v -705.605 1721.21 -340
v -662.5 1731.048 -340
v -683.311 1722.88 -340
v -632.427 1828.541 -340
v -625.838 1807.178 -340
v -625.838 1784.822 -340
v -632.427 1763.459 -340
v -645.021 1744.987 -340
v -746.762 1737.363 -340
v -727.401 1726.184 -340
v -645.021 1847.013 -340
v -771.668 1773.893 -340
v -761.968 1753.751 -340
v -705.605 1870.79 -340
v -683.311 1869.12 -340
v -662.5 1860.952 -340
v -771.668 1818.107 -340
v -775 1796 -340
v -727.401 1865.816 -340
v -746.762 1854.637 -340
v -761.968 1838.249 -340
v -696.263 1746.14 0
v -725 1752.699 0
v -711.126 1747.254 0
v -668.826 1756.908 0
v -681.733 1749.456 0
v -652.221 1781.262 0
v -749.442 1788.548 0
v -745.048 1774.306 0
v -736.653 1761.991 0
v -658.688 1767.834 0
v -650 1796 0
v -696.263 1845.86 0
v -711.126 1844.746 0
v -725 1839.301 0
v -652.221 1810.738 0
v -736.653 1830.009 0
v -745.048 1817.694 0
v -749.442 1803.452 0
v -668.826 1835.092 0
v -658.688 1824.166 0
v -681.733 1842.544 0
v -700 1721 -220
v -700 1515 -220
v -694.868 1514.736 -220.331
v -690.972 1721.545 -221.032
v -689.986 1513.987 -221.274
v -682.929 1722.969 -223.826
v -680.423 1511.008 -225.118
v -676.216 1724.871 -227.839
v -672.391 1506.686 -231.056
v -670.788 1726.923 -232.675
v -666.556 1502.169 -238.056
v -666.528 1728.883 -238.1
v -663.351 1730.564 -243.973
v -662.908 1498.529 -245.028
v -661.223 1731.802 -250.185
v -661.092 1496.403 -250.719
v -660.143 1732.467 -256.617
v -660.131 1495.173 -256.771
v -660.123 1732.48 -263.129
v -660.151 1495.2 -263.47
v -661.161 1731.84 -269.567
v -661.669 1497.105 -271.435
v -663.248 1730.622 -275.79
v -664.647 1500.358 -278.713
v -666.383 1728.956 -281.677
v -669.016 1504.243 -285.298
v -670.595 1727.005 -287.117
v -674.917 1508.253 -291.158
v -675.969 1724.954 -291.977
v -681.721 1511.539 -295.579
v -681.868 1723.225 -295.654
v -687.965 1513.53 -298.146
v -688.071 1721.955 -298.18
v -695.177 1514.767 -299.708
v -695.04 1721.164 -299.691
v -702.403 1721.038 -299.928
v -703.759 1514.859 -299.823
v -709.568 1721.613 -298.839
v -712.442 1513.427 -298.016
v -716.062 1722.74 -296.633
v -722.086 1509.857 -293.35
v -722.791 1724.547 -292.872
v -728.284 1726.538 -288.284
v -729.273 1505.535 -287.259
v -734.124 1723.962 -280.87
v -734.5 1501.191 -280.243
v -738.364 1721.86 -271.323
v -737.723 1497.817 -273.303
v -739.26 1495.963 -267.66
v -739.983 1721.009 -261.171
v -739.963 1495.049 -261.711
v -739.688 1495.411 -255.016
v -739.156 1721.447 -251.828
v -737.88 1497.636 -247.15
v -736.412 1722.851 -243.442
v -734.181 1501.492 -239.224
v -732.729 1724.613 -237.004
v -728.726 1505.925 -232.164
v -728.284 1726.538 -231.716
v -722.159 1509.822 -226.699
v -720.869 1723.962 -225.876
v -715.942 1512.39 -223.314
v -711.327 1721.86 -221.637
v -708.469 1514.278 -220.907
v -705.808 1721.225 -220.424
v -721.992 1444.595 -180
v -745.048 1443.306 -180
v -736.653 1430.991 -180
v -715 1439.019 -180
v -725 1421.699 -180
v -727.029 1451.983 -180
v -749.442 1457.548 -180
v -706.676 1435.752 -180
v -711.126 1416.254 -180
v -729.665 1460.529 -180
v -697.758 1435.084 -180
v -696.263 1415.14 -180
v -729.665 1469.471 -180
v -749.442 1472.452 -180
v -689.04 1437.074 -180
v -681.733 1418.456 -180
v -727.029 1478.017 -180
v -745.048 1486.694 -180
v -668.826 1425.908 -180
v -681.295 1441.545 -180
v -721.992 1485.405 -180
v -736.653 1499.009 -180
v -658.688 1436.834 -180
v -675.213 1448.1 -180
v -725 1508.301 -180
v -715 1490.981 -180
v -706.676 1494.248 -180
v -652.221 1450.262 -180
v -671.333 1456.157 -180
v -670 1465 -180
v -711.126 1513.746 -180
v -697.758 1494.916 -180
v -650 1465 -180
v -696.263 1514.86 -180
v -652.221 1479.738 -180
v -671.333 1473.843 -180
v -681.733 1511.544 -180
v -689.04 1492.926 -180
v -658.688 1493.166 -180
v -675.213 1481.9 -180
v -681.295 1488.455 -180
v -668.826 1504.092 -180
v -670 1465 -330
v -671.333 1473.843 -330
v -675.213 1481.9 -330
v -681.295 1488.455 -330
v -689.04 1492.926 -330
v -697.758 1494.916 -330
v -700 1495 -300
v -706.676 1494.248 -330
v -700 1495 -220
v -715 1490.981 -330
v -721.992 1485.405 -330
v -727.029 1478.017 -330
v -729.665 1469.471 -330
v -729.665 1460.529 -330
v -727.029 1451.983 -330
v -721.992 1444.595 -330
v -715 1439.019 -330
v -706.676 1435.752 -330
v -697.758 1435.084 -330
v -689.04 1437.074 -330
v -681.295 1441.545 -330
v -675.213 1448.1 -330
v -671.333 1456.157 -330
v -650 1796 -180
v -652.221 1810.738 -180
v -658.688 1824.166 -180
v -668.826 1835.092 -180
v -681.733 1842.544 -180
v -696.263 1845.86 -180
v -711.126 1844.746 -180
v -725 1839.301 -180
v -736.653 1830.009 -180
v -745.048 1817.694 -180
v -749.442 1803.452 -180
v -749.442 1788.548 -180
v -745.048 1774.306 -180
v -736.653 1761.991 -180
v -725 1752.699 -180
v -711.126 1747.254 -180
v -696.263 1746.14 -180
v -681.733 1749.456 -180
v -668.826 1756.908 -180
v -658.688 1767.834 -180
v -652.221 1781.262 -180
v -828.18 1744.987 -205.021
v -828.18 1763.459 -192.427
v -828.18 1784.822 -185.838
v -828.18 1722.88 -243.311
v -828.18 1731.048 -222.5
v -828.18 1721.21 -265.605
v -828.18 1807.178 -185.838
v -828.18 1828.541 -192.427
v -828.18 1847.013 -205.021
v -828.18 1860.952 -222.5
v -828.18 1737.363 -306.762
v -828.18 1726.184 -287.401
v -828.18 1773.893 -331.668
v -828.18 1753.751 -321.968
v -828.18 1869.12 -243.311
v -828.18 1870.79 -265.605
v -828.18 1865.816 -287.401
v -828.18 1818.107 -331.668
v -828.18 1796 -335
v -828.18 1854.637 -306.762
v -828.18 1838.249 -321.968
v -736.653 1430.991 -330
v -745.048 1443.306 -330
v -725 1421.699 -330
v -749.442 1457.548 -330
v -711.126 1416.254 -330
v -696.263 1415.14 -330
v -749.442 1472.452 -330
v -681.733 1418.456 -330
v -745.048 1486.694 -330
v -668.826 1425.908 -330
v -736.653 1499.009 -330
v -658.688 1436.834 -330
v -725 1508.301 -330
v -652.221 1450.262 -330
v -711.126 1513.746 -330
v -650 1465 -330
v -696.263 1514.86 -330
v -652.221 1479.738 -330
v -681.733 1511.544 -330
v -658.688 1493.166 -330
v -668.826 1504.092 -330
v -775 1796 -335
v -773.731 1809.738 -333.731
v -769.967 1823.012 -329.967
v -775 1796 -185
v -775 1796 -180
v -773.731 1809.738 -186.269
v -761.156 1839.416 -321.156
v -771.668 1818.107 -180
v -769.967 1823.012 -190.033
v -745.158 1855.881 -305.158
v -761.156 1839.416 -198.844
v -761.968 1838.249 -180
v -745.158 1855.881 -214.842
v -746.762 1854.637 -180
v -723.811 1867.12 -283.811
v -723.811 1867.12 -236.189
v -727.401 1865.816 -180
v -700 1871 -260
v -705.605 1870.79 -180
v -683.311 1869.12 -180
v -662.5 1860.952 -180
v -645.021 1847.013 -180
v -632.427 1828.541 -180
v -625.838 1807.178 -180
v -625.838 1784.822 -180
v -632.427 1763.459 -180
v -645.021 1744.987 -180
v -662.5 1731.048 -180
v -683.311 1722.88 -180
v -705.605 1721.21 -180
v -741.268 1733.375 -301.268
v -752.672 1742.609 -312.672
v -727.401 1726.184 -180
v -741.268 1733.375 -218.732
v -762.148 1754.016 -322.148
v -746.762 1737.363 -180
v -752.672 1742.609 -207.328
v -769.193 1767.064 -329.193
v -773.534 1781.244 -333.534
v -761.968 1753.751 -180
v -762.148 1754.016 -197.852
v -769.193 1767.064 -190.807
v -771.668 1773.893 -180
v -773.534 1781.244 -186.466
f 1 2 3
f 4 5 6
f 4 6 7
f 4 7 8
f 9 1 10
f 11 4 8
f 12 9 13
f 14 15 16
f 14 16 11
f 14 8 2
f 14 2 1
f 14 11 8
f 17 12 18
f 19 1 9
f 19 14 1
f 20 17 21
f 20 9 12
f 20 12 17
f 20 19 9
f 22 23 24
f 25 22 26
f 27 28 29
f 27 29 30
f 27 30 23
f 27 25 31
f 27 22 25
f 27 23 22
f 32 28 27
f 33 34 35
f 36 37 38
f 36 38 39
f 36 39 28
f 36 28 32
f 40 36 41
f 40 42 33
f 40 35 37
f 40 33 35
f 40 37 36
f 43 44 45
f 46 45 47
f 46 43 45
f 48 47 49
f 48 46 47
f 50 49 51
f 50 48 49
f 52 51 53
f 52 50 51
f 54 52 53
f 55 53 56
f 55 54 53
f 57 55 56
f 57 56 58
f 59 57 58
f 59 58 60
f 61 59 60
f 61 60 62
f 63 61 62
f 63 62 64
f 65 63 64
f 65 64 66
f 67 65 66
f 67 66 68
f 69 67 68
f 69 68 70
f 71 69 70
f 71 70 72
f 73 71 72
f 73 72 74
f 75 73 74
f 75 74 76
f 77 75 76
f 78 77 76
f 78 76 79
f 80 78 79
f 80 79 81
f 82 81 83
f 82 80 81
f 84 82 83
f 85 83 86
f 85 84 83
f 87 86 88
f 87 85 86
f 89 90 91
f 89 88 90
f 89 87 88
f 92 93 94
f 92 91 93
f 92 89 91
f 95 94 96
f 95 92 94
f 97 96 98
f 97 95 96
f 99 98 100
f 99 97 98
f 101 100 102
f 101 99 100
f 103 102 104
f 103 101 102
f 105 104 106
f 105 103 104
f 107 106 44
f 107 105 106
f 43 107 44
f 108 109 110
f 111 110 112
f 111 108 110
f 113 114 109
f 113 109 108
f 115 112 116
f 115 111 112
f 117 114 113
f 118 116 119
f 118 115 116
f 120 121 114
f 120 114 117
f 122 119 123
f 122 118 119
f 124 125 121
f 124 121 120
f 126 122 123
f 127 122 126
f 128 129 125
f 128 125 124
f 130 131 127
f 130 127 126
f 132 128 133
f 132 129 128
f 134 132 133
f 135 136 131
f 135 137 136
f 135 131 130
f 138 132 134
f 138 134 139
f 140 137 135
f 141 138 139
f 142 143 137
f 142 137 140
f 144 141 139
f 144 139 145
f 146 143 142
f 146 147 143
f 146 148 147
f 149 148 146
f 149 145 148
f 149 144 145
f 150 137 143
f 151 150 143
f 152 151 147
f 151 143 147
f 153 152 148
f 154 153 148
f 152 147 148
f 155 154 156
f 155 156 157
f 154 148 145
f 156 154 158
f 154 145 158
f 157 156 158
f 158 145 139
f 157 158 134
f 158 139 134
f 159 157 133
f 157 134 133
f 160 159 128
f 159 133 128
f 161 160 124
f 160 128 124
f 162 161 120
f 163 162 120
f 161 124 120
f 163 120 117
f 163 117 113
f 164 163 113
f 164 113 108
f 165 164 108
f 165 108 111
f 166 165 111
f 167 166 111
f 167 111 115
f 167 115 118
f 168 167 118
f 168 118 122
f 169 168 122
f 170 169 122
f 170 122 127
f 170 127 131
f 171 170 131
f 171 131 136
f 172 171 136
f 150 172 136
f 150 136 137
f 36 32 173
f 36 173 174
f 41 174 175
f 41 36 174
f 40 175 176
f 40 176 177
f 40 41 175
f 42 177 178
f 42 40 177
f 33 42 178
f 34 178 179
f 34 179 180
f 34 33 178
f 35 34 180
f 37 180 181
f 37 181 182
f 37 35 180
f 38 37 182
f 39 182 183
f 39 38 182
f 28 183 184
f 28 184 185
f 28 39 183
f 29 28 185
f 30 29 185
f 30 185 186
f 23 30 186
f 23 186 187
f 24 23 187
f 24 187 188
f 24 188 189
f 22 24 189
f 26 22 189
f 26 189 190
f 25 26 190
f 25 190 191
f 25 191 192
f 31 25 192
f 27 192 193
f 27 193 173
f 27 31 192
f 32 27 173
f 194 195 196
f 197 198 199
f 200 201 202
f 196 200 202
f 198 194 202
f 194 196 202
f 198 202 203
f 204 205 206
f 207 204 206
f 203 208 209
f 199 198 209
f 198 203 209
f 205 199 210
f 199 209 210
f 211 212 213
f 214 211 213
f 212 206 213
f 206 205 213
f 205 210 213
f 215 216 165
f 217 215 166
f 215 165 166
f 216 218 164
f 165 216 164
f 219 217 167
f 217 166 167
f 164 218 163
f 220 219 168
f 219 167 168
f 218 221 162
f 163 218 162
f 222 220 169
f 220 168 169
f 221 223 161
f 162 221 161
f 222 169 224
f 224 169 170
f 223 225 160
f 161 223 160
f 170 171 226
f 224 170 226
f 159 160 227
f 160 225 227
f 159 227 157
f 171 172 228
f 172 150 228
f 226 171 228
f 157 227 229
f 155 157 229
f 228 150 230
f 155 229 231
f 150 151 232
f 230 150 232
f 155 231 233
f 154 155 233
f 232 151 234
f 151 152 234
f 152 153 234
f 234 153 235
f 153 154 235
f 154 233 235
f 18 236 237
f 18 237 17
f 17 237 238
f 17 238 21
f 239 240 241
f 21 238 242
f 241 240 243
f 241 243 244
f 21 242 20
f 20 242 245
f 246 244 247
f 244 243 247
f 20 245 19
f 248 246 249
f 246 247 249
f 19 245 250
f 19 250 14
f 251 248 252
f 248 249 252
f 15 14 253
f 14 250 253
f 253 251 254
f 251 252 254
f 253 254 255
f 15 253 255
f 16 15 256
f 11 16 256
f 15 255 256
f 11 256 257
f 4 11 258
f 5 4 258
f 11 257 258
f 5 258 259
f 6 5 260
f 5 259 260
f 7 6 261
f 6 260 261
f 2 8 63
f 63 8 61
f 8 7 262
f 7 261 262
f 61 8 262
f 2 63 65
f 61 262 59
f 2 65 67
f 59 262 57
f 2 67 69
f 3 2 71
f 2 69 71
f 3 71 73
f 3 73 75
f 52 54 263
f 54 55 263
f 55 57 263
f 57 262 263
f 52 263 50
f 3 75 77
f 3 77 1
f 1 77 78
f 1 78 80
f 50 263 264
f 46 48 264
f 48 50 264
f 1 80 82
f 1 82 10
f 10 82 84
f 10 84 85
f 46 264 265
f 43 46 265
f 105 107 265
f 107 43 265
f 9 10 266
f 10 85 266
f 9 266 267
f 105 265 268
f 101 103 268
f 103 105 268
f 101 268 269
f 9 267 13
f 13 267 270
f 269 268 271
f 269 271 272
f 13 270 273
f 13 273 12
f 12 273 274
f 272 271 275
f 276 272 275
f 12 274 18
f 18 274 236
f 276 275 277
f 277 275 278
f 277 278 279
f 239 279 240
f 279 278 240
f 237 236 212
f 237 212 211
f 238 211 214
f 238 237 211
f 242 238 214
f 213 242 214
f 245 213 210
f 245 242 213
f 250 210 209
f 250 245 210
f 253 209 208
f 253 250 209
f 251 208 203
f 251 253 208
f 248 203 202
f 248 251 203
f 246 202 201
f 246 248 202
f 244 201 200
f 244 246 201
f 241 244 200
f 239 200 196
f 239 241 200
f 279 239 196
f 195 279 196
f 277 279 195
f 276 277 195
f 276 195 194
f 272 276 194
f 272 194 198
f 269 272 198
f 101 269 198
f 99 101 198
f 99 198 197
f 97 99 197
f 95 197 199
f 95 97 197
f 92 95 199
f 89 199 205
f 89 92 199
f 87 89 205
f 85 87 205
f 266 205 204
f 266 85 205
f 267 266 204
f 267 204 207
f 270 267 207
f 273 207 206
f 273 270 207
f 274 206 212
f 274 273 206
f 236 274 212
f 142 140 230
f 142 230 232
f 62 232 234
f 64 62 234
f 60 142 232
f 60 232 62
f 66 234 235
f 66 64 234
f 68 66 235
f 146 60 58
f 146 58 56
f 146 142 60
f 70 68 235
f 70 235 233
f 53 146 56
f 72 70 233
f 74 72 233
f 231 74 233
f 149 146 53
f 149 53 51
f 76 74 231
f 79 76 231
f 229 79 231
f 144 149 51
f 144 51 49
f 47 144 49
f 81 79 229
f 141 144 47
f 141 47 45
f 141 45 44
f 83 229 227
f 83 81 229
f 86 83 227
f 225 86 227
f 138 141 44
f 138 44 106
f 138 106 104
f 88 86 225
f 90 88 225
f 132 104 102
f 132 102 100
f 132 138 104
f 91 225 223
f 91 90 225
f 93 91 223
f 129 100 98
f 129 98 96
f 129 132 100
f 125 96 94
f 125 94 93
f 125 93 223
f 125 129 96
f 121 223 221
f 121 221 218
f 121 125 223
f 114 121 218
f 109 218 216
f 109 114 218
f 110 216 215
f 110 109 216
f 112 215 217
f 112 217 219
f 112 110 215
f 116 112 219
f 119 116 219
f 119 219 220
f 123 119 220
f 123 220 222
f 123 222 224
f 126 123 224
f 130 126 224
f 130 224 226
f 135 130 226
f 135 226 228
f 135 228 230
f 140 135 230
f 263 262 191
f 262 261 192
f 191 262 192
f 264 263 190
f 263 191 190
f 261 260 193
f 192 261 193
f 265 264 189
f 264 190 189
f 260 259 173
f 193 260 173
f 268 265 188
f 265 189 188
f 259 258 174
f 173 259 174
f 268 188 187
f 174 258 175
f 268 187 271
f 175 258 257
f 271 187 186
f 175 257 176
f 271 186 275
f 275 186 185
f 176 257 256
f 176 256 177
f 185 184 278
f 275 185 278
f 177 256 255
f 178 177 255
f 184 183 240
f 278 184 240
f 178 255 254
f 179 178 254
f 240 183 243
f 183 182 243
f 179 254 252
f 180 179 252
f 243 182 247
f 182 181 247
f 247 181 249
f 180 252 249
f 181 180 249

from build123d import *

# Parameters (mm, degrees)
SKETCH1_R           = 50
BOSS_EXTRUDE1_DEPTH = 180
SKETCH2_R           = 75
BOSS_EXTRUDE2_DEPTH = 160
SKETCH3_R           = 75
BOSS_EXTRUDE3_DEPTH = 128.18
SKETCH4_R           = 40
BOSS_EXTRUDE4_DEPTH = 300
SKETCH5_R           = 50
SKETCH5_R_2         = 30
BOSS_EXTRUDE5_DEPTH = 150


with BuildPart() as part:
    # Sketch1 → Boss-Extrude1 (new body)
    with BuildSketch(Plane.XY):
        with Locations((-700, 1796)):
            Circle(SKETCH1_R)
    extrude(amount=-BOSS_EXTRUDE1_DEPTH)

    # Sketch2 → Boss-Extrude2 (add)
    with BuildSketch(Plane(origin=(0, 0, -180), x_dir=(-1, 0, 0), z_dir=(0, 0, -1))):
        with Locations((700, 1796)):
            Circle(SKETCH2_R)
    extrude(amount=BOSS_EXTRUDE2_DEPTH)

    # Sketch3 → Boss-Extrude3 (add)
    with BuildSketch(Plane(origin=(-700, 0, 0), x_dir=(0, 0, -1), z_dir=(1, 0, 0))):
        with Locations((260, 1796)):
            Circle(SKETCH3_R)
    extrude(amount=-BOSS_EXTRUDE3_DEPTH)

    # Sketch4 → Boss-Extrude4 (add)
    with BuildSketch(Plane(origin=(0, 1795, 0), x_dir=(-1, 0, 0), z_dir=(0, 1, 0))):
        with Locations(Location((700, -260, 0), (0, 0, 90))):
            Circle(SKETCH4_R)
    extrude(amount=-BOSS_EXTRUDE4_DEPTH)

    # Sketch5 → Boss-Extrude5 (add)
    with BuildSketch(Plane.XY.offset(-180)):
        with Locations((-700, 1465)):
            Circle(SKETCH5_R)
        with Locations((-700, 1465)):
            Circle(SKETCH5_R_2, mode=Mode.SUBTRACT)
    extrude(amount=-BOSS_EXTRUDE5_DEPTH)


solid = part.part
